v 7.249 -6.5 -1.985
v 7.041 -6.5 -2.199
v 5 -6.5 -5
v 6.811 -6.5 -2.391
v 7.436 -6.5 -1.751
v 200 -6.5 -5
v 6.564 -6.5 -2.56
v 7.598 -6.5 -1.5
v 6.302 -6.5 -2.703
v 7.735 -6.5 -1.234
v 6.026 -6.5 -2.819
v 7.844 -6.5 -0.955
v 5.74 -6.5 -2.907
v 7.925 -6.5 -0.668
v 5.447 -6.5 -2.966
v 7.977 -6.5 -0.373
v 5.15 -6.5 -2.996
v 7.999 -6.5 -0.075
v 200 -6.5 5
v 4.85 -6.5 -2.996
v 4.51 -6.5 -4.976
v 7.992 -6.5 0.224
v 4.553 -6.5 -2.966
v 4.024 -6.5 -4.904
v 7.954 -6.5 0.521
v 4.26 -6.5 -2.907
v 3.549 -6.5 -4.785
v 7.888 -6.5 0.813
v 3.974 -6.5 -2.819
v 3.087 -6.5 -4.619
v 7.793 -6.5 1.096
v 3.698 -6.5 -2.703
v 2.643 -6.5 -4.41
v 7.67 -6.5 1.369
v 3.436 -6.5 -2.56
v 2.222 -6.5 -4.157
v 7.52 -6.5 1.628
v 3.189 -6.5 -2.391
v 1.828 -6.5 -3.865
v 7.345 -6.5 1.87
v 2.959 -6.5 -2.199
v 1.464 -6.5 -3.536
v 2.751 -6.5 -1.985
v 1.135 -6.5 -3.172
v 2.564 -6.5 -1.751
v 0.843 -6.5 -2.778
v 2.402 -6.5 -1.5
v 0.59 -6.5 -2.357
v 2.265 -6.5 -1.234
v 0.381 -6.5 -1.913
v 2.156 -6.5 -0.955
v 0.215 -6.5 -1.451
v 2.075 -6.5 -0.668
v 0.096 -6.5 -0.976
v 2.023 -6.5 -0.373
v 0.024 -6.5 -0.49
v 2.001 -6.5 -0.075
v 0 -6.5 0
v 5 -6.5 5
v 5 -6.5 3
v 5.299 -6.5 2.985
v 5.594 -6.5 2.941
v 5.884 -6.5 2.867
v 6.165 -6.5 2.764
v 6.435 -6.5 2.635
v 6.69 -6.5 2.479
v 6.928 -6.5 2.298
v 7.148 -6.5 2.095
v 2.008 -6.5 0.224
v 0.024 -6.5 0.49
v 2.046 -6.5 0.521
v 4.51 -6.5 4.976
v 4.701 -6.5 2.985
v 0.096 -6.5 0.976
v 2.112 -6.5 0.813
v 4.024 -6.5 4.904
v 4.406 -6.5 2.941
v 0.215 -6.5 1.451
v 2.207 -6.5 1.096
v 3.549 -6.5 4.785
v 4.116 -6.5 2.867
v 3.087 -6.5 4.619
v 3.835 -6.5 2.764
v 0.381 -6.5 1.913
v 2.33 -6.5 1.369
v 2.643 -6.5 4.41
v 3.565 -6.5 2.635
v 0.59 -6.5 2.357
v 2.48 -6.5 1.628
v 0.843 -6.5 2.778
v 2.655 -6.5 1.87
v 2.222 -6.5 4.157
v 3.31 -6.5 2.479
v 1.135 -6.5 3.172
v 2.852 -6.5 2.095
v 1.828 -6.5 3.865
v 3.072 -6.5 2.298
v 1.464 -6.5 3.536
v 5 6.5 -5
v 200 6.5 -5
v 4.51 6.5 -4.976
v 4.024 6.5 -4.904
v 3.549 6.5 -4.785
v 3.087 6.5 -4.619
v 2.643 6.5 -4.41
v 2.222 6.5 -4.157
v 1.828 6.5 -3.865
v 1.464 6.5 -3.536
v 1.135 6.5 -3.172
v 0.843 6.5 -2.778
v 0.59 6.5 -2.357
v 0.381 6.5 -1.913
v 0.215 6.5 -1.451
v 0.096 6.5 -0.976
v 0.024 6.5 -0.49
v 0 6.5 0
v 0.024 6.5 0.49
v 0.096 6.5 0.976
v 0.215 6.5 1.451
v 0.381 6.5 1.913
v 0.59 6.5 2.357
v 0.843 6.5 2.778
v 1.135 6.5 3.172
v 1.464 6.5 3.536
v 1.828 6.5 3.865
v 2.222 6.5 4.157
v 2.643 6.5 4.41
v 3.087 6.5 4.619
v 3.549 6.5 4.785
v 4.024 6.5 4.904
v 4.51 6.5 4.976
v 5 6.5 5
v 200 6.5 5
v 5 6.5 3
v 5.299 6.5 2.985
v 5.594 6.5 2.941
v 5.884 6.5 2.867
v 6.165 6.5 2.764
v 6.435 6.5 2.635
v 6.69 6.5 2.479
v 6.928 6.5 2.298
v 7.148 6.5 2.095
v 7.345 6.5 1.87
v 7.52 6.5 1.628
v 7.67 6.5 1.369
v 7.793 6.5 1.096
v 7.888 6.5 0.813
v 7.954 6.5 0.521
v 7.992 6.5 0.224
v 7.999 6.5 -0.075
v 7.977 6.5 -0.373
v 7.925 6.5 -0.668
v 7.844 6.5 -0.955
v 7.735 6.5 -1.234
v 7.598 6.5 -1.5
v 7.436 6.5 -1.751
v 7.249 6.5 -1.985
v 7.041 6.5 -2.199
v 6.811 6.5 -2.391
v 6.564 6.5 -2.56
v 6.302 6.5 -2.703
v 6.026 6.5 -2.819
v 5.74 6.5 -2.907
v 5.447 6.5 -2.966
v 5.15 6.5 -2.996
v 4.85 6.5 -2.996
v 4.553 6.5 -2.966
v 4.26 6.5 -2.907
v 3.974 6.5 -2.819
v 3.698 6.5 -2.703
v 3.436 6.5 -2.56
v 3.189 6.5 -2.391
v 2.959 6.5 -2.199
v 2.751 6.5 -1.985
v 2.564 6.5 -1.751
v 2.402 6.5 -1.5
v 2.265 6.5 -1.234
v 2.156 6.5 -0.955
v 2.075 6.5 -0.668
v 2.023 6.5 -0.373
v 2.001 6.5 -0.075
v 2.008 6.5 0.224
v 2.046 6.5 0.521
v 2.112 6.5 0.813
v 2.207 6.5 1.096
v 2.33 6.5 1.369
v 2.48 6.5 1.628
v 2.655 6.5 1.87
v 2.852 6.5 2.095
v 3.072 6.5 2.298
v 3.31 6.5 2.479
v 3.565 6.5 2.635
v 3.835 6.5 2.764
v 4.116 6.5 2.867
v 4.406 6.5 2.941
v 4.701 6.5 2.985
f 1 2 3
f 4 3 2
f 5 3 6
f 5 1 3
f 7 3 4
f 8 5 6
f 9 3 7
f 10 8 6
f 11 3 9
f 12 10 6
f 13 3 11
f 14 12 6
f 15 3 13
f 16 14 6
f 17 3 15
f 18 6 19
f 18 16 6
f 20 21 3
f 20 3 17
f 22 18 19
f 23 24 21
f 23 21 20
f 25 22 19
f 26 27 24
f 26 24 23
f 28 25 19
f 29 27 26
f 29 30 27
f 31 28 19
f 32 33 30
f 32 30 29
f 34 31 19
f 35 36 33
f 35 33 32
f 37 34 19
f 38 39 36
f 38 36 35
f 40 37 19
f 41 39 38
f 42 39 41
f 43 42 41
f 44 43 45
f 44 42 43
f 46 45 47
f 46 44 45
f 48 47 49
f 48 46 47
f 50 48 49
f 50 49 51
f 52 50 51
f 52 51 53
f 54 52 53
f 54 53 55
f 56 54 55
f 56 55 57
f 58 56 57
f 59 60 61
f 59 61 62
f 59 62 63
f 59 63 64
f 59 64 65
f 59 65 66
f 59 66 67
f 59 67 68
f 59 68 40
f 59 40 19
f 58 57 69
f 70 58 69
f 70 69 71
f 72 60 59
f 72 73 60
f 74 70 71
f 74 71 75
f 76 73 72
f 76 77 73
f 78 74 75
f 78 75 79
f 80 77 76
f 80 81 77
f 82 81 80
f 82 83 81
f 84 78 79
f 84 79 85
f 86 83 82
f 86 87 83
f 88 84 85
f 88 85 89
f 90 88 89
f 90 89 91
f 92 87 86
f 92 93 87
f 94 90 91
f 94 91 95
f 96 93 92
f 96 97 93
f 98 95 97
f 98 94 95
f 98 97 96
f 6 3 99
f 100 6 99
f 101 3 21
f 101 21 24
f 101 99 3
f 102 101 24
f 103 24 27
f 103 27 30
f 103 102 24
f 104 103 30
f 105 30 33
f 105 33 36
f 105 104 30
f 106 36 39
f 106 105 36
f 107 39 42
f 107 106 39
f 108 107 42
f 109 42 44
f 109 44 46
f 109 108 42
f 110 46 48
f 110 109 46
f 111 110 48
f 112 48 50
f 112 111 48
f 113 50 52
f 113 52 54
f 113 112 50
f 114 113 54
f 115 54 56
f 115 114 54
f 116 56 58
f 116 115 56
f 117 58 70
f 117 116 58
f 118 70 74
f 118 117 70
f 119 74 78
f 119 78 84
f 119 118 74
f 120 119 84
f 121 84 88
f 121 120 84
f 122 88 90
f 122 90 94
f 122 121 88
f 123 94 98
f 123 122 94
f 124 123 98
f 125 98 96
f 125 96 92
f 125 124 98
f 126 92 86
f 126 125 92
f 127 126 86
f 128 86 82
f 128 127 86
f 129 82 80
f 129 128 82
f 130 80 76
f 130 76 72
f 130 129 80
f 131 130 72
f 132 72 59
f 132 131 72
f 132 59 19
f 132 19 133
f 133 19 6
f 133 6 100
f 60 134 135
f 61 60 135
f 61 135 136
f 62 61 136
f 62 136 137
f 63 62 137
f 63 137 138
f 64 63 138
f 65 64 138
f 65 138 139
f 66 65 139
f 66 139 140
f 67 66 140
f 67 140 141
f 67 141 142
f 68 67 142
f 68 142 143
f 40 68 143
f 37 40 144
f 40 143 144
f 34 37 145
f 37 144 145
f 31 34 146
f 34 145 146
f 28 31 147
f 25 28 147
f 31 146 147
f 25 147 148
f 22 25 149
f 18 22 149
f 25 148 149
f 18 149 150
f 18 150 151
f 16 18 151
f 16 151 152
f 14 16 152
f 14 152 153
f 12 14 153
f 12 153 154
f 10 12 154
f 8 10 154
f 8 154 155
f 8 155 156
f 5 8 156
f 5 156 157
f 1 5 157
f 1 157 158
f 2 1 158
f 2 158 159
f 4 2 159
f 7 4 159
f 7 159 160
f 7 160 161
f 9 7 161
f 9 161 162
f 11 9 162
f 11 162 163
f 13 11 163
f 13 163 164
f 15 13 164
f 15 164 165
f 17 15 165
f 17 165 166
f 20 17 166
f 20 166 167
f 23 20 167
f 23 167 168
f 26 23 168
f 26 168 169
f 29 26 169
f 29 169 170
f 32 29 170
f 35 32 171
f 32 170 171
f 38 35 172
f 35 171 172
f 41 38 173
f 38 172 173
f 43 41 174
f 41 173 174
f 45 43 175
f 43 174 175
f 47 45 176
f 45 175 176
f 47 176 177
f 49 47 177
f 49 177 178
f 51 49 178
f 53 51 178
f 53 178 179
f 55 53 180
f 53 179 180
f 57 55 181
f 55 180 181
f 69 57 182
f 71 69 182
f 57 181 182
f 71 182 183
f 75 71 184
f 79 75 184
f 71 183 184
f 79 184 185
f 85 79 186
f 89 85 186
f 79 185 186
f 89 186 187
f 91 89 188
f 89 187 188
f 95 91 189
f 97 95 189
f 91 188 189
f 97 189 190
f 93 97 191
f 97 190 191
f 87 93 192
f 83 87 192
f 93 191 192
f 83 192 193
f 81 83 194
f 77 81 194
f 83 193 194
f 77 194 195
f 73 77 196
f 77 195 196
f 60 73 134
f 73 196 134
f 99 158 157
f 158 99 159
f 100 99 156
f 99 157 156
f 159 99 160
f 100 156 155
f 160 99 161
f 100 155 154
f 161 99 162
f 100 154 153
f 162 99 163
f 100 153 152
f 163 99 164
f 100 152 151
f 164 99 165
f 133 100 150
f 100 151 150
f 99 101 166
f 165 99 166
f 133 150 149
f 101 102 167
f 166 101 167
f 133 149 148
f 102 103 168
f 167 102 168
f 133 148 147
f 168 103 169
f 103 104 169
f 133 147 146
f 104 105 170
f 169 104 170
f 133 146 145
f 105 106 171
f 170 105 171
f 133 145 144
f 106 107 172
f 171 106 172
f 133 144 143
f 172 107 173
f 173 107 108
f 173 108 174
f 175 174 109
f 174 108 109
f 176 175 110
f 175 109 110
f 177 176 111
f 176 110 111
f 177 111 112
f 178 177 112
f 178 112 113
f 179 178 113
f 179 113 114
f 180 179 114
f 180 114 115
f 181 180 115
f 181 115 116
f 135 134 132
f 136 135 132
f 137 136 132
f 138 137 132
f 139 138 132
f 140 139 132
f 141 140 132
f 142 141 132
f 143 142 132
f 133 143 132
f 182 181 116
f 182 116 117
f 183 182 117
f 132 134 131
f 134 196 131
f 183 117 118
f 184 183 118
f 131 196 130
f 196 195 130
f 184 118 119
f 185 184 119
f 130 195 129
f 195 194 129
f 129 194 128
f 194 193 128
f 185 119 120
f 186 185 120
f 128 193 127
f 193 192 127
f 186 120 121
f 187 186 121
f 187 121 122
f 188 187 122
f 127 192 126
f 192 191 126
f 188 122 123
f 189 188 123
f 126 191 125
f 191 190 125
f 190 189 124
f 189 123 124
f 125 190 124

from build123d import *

# Parameters (mm, degrees)
SKETCH1_W           = 13
SKETCH1_H           = 10
BOSS_EXTRUDE1_DEPTH = 200
SKETCH2_R           = 3
CUT_EXTRUDE1_DEPTH  = 201.484413359
FILLET1_R           = 5


with BuildPart() as part:
    # Sketch1 → Boss-Extrude1 (new body)
    with BuildSketch(Plane.YZ):
        Rectangle(SKETCH1_W, SKETCH1_H)
    extrude(amount=BOSS_EXTRUDE1_DEPTH)

    # Sketch2 → Cut-Extrude1 (cut, through all)
    with BuildSketch(Plane(origin=(0, 6.5, 0), x_dir=(-1, 0, 0), z_dir=(0, 1, 0))):
        with Locations(Location((-5, 0, 0), (0, 0, 90))):
            Circle(SKETCH2_R)
    extrude(amount=-CUT_EXTRUDE1_DEPTH, mode=Mode.SUBTRACT)

    # Fillet1
    fillet1_edges = [part.edges().sort_by_distance(p)[0] for p in [
        (0, 0, 5),
        (0, 0, -5),
    ]]
    fillet(fillet1_edges, radius=FILLET1_R - 0.0001)  # a hair under: the kernel refuses the full size


solid = part.part
